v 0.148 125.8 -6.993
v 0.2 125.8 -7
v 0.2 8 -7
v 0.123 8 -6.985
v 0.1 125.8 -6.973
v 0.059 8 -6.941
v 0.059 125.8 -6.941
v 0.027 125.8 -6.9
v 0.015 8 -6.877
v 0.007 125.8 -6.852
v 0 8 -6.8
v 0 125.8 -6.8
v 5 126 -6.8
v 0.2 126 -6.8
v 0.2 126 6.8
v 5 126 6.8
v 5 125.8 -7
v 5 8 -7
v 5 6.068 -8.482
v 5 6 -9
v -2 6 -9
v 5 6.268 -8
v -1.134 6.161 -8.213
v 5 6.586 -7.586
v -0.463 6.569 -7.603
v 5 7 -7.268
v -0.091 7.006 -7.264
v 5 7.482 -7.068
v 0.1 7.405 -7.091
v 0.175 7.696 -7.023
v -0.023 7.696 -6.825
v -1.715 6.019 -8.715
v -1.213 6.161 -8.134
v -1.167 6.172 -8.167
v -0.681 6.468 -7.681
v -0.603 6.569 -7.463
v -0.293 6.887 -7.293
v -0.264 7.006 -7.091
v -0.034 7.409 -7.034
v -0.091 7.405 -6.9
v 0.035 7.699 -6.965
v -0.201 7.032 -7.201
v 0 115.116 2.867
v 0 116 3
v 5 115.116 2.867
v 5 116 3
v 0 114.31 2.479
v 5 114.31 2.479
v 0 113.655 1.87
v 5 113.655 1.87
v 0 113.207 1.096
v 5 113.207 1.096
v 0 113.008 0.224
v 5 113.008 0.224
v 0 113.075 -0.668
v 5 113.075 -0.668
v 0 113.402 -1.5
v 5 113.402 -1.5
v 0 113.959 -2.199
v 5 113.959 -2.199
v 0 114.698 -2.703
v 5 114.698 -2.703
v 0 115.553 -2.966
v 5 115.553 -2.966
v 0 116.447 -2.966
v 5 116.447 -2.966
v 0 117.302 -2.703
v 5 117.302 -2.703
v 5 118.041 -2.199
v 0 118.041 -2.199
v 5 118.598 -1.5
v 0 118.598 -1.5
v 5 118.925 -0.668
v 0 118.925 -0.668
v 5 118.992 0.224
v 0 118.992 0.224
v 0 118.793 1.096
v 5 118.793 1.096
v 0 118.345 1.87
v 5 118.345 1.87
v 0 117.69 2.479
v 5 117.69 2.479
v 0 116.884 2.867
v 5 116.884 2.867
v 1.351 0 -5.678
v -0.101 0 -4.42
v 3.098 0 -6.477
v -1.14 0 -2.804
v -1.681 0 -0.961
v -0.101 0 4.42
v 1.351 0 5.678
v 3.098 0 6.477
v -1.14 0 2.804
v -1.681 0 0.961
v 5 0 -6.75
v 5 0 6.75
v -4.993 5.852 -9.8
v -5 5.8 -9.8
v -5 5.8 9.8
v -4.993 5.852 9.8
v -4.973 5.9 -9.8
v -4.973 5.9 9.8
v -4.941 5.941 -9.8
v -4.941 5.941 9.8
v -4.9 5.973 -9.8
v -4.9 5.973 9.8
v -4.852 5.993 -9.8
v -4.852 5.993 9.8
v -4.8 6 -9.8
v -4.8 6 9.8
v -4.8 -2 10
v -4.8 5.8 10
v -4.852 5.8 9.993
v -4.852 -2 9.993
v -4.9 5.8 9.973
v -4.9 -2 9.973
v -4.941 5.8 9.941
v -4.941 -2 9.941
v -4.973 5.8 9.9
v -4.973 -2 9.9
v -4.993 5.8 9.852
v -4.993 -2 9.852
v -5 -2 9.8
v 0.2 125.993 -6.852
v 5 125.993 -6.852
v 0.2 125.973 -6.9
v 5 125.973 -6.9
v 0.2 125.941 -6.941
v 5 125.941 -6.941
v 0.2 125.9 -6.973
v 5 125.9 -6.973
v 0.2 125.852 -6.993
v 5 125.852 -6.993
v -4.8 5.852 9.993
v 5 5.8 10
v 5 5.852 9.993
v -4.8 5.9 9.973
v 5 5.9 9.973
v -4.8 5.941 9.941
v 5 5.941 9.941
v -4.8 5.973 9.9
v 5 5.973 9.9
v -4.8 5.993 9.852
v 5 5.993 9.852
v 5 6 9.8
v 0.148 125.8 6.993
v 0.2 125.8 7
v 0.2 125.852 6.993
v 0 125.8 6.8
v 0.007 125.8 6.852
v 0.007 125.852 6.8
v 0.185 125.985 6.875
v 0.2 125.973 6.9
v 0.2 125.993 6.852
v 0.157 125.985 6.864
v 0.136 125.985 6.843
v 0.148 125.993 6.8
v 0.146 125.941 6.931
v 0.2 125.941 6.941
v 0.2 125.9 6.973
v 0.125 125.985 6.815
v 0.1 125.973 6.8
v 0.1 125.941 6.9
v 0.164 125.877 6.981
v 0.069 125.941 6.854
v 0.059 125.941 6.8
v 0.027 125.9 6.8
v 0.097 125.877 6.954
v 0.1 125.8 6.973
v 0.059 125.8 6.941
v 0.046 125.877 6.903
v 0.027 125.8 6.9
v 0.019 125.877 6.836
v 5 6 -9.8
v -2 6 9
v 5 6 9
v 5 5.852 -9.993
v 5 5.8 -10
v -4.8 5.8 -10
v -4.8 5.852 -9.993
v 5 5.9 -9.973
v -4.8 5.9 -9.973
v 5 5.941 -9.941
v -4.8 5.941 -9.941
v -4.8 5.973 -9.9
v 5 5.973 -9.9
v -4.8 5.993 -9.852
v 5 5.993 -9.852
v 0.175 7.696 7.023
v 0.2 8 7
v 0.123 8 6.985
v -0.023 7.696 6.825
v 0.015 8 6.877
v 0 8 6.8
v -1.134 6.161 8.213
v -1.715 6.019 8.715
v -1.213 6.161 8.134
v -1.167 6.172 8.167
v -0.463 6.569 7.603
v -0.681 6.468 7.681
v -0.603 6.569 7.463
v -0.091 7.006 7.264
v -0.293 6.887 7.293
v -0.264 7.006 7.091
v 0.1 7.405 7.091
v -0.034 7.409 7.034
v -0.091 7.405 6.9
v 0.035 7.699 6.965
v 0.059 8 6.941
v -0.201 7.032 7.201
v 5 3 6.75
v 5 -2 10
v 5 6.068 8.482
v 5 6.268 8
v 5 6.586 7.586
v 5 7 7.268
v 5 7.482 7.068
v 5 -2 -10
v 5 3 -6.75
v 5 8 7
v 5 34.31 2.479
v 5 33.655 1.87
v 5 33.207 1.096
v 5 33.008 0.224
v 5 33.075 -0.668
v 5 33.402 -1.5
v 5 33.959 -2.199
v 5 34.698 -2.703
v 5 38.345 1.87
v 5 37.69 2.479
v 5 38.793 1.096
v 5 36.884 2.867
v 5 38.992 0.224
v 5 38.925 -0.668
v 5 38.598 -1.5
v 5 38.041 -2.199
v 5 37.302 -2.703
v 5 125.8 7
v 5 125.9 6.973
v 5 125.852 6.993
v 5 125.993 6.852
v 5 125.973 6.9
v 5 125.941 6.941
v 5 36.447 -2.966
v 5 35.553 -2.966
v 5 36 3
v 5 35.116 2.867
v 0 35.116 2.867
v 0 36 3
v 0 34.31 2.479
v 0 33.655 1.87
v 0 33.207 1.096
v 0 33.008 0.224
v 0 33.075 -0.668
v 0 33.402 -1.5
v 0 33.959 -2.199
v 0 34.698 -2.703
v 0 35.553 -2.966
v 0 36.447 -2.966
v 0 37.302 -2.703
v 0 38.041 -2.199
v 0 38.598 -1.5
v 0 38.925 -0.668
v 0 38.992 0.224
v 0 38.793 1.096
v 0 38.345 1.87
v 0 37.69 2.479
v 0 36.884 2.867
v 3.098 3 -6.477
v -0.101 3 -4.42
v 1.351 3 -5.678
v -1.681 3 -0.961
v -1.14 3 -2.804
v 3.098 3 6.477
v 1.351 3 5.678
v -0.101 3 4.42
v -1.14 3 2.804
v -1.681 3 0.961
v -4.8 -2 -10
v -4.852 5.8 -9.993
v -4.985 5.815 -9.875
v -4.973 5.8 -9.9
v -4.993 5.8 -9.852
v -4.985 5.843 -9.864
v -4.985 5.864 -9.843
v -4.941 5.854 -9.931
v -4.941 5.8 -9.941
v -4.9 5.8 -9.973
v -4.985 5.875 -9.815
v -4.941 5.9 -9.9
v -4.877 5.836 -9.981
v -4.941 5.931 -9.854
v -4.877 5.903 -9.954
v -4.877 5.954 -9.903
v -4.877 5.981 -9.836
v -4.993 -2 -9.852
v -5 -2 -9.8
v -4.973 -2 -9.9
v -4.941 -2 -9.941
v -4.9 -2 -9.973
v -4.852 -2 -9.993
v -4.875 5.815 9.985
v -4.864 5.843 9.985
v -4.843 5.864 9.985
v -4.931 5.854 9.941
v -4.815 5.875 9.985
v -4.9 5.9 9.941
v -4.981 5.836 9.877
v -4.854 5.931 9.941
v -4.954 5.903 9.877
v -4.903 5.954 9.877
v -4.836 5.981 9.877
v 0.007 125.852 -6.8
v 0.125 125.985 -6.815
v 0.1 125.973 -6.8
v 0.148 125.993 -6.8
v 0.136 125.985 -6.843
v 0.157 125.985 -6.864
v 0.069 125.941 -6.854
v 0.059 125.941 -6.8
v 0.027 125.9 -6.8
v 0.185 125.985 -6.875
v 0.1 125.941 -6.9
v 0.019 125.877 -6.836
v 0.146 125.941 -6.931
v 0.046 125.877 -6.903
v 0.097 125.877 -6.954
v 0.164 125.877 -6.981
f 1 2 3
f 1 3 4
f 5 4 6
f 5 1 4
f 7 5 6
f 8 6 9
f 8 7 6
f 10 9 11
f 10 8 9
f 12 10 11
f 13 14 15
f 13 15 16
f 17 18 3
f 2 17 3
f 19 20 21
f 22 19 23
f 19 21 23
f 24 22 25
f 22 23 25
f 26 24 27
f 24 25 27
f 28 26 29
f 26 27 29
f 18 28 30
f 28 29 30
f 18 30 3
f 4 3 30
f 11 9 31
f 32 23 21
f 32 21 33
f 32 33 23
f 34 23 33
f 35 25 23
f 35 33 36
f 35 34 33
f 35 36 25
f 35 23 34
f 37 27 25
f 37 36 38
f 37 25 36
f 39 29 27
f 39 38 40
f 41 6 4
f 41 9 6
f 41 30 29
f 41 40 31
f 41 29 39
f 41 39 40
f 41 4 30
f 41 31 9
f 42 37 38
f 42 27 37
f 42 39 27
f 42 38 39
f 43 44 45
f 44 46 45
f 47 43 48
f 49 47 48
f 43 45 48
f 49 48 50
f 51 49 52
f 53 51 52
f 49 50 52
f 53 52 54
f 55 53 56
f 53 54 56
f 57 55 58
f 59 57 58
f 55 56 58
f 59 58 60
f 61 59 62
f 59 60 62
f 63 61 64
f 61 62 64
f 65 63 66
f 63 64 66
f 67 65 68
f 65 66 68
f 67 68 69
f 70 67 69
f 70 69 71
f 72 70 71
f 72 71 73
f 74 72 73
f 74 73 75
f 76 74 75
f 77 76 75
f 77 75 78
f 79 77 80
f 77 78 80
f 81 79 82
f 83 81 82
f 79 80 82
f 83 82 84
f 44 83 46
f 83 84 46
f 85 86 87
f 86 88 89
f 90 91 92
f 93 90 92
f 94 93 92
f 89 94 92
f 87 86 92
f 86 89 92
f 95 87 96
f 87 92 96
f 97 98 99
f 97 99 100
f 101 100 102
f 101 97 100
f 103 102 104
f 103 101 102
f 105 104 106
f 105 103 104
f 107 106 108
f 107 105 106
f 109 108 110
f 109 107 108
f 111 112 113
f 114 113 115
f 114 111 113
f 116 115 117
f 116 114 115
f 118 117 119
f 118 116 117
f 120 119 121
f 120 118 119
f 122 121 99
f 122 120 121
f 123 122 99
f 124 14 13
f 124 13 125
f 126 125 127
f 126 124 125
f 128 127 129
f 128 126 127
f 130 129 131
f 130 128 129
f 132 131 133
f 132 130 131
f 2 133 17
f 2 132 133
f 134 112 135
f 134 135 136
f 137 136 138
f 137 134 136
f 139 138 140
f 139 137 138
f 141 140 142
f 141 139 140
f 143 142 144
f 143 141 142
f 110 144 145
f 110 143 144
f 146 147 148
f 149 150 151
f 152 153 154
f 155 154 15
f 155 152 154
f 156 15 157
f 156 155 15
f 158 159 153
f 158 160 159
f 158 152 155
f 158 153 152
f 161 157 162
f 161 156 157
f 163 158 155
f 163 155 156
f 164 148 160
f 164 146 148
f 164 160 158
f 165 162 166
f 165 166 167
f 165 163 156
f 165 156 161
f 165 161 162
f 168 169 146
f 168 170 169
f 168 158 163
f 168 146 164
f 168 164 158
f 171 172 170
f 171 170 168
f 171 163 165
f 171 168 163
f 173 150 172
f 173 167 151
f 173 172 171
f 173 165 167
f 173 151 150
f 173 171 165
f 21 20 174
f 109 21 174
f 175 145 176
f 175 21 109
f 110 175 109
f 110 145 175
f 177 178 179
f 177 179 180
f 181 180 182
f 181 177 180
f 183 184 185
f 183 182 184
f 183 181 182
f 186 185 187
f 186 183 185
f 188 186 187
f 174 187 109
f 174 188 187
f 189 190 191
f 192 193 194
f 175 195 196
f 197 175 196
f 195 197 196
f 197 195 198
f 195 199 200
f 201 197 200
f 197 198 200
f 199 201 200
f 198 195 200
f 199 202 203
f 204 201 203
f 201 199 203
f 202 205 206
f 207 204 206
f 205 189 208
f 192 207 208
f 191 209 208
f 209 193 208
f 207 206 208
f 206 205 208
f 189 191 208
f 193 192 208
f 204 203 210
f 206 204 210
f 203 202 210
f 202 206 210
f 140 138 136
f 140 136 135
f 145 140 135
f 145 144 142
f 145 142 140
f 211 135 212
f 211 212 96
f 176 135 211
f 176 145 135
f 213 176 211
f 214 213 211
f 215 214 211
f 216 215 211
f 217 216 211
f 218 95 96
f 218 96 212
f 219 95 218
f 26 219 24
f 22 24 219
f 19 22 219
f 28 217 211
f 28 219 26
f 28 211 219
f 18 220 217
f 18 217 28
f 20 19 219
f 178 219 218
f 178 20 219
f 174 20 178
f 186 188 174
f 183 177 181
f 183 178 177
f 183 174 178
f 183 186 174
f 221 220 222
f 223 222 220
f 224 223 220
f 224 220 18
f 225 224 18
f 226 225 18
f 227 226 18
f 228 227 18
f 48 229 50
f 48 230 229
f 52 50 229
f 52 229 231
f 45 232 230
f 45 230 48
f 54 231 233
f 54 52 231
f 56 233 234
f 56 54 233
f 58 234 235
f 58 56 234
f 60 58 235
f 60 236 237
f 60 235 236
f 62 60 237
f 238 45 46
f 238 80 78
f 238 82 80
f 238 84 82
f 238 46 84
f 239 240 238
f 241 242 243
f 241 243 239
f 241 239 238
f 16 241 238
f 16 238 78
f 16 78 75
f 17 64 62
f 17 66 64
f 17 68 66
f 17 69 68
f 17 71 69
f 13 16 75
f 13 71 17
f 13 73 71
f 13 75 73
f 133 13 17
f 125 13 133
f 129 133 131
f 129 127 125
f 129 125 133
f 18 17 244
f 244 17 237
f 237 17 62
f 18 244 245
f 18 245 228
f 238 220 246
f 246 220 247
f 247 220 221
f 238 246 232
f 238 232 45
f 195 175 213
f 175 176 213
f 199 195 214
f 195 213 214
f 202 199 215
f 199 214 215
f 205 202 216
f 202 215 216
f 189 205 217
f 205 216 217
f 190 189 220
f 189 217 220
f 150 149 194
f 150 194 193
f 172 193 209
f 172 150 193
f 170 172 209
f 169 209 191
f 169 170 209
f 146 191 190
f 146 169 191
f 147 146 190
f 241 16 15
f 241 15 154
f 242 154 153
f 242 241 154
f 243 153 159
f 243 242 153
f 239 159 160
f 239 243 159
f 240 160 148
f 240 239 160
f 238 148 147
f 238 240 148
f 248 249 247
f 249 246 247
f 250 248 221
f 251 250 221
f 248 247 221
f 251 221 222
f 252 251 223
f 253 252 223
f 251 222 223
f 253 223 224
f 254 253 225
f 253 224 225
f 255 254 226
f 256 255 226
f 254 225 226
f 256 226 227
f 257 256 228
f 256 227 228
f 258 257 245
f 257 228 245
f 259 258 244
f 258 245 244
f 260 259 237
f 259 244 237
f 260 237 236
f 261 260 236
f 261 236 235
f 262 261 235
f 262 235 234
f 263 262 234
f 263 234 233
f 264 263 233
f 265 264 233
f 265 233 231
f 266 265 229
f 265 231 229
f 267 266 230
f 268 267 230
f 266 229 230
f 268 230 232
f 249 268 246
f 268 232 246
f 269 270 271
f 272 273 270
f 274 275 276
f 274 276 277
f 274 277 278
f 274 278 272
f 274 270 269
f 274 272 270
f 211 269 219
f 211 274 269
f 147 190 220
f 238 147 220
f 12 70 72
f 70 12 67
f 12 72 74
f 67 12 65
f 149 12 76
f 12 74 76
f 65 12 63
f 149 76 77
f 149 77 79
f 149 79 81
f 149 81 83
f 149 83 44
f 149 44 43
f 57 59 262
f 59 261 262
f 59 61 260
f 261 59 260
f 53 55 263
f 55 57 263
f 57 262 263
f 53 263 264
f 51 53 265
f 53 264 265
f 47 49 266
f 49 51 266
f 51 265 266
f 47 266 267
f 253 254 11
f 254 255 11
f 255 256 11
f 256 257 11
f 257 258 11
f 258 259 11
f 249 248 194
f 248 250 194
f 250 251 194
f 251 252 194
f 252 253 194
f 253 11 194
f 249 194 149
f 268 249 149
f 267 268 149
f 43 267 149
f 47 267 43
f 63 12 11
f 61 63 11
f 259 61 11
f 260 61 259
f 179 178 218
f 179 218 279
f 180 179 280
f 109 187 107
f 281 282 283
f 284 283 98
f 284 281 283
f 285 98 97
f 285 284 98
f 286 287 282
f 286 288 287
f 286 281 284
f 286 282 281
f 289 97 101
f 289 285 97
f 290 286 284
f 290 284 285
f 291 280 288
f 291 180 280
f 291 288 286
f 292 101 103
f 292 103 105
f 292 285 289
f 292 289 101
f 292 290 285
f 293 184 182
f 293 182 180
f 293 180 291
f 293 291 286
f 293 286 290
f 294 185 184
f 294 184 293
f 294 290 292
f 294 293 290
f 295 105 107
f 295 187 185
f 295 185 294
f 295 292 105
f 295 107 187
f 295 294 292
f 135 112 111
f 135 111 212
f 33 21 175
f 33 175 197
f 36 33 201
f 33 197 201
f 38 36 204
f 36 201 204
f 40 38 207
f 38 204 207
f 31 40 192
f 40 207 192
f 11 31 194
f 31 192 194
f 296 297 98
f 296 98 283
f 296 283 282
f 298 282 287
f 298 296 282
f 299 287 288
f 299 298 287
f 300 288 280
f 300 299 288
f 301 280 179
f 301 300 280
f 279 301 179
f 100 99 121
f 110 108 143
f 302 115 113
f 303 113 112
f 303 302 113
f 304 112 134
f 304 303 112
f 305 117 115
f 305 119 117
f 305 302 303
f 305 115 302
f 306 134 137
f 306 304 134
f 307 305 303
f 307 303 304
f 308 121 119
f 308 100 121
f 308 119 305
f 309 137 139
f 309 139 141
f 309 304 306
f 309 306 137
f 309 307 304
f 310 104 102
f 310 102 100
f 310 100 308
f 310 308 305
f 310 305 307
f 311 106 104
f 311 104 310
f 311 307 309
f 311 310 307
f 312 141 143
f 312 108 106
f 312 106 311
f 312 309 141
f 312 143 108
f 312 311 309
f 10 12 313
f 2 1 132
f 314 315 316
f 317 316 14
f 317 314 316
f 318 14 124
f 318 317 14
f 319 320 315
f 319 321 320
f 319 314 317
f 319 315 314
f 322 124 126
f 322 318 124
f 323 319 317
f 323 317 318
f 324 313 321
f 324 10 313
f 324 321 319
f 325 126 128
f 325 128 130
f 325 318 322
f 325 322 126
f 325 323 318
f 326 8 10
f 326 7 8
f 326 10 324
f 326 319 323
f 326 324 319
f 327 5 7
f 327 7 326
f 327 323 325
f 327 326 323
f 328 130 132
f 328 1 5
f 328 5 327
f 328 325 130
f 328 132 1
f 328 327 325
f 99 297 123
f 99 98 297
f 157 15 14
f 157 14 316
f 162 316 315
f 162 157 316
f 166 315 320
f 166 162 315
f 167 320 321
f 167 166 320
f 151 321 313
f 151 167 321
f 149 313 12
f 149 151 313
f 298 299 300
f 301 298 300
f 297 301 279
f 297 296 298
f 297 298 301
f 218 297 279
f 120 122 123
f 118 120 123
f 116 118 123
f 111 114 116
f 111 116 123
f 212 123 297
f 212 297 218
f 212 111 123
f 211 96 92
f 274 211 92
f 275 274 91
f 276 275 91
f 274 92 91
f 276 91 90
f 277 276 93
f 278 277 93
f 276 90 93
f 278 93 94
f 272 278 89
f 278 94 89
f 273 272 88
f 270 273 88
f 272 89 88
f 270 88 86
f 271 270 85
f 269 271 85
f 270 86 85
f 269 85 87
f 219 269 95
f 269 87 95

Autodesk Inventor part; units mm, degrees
ref_plane "YZ Plane" through (0, 0, 0) normal (1, 0, 0) x (0, 1, 0)
ref_plane "XZ Plane" through (0, 0, 0) normal (0, 1, 0) x (-1, 0, 0)
ref_plane "XY Plane" through (0, 0, 0) normal (0, 0, 1) x (1, 0, 0)
sketch "スケッチ1" plane through (0, 0, 0) normal (0, 1, 0) x (-1, 0, 0)
  line L0 (5, -10) -> (-5, -10)
  line L1 (-5, -10) -> (-5, 10)
  line L2 (-5, 10) -> (5, 10)
  line L3 (5, 10) -> (5, -10)
  line L4 (5, -10) -> (-5, 10) construction
  line L5 (-5, -10) -> (5, 10) construction
  point P0 (0, 0)
  dimension "d0" = 10
  dimension "d1" = 20
extrude "押し出し1" add sketch "スケッチ1" along normal blind 6
sketch "スケッチ2" plane through (0, 0, 0) normal (0, -1, 0) x (1, 0, 0)
  line L0 (5, 10) -> (5, -10) projected
  circle A0 centre (5, 0) radius 6.75
  point P0 (0, 0)
  point P1 (5, -6.75)
  point P2 (5, 6.75)
  dimension "d4" = 13.5
extrude "押し出し2" cut sketch "スケッチ2" against normal blind 3 contours L0 A0 picked at (3.1483, 1.2781)
sketch "スケッチ3" plane through (0, 0, 0) normal (0, -1, 0) x (1, 0, 0)
  line L0 (-5, 10) -> (5, 10)
  line L1 (5, 10) -> (5, -10)
  line L2 (5, -10) -> (-5, -10)
  line L3 (-5, -10) -> (-5, 10)
  line L4 (-5, 10) -> (5, -10) construction
  line L5 (5, 10) -> (-5, -10) construction
  point P0 (0, 0)
  dimension "d7" = 10
  dimension "d8" = 20
extrude "押し出し3" add sketch "スケッチ3" along normal blind 2
sketch "スケッチ4" plane through (0, 6, 0) normal (0, 1, 0) x (1, 0, 0)
  line L0 (5, 7) -> (0, 7)
  line L1 (0, 7) -> (0, -7)
  line L2 (0, -7) -> (5, -7)
  line L3 (5, -7) -> (5, 7)
  line L4 (5, -10) -> (5, 10) projected
  point P0 (0, 0)
  dimension "d11" = 5
  dimension "d12" = 14
  dimension "d13" = 5
  dimension "d14" = 7
extrude "押し出し4" add sketch "スケッチ4" along normal blind 120
fillet "フィレット1" radius 2 3 edges at (2.5, 6, 7) (2.5, 6, -7) (0, 6, 0)
fillet "フィレット2" radius 0.2 12 edges at (-0.5858, 6.5858, -7.5858) (0, 67, -7) (-0.5858, 6.5858, 7.5858) (0, 67, 7) (2.5, 126, 7) (0, 126, 0) (2.5, 126, -7) (0, 6, -10) (-5, 6, 0) (0, 6, 10) (-5, 2, 10) (-5, 2, -10)
sketch "スケッチ5" plane through (0, 8, 6.8) normal (-1, 0, 0) x (0, 0, 1)
  line L0 (3, -2) -> (-16.6, -2) projected
  line L1 (-13.8, 117.8) -> (-13.8, 0) projected
  point P0 (-6.8, -8)
  point P1 (-6.8, 28)
  point P2 (-6.8, 108)
  dimension "d19" = 30
  dimension "d20" = 80
  dimension "d21" = 7
  dimension "d22" = 7
hole "穴1" at (0, 36, 0) at (0, 116, 0) direction (1, 0, 0) diameter 6 end through all
properties part number "baseB"
